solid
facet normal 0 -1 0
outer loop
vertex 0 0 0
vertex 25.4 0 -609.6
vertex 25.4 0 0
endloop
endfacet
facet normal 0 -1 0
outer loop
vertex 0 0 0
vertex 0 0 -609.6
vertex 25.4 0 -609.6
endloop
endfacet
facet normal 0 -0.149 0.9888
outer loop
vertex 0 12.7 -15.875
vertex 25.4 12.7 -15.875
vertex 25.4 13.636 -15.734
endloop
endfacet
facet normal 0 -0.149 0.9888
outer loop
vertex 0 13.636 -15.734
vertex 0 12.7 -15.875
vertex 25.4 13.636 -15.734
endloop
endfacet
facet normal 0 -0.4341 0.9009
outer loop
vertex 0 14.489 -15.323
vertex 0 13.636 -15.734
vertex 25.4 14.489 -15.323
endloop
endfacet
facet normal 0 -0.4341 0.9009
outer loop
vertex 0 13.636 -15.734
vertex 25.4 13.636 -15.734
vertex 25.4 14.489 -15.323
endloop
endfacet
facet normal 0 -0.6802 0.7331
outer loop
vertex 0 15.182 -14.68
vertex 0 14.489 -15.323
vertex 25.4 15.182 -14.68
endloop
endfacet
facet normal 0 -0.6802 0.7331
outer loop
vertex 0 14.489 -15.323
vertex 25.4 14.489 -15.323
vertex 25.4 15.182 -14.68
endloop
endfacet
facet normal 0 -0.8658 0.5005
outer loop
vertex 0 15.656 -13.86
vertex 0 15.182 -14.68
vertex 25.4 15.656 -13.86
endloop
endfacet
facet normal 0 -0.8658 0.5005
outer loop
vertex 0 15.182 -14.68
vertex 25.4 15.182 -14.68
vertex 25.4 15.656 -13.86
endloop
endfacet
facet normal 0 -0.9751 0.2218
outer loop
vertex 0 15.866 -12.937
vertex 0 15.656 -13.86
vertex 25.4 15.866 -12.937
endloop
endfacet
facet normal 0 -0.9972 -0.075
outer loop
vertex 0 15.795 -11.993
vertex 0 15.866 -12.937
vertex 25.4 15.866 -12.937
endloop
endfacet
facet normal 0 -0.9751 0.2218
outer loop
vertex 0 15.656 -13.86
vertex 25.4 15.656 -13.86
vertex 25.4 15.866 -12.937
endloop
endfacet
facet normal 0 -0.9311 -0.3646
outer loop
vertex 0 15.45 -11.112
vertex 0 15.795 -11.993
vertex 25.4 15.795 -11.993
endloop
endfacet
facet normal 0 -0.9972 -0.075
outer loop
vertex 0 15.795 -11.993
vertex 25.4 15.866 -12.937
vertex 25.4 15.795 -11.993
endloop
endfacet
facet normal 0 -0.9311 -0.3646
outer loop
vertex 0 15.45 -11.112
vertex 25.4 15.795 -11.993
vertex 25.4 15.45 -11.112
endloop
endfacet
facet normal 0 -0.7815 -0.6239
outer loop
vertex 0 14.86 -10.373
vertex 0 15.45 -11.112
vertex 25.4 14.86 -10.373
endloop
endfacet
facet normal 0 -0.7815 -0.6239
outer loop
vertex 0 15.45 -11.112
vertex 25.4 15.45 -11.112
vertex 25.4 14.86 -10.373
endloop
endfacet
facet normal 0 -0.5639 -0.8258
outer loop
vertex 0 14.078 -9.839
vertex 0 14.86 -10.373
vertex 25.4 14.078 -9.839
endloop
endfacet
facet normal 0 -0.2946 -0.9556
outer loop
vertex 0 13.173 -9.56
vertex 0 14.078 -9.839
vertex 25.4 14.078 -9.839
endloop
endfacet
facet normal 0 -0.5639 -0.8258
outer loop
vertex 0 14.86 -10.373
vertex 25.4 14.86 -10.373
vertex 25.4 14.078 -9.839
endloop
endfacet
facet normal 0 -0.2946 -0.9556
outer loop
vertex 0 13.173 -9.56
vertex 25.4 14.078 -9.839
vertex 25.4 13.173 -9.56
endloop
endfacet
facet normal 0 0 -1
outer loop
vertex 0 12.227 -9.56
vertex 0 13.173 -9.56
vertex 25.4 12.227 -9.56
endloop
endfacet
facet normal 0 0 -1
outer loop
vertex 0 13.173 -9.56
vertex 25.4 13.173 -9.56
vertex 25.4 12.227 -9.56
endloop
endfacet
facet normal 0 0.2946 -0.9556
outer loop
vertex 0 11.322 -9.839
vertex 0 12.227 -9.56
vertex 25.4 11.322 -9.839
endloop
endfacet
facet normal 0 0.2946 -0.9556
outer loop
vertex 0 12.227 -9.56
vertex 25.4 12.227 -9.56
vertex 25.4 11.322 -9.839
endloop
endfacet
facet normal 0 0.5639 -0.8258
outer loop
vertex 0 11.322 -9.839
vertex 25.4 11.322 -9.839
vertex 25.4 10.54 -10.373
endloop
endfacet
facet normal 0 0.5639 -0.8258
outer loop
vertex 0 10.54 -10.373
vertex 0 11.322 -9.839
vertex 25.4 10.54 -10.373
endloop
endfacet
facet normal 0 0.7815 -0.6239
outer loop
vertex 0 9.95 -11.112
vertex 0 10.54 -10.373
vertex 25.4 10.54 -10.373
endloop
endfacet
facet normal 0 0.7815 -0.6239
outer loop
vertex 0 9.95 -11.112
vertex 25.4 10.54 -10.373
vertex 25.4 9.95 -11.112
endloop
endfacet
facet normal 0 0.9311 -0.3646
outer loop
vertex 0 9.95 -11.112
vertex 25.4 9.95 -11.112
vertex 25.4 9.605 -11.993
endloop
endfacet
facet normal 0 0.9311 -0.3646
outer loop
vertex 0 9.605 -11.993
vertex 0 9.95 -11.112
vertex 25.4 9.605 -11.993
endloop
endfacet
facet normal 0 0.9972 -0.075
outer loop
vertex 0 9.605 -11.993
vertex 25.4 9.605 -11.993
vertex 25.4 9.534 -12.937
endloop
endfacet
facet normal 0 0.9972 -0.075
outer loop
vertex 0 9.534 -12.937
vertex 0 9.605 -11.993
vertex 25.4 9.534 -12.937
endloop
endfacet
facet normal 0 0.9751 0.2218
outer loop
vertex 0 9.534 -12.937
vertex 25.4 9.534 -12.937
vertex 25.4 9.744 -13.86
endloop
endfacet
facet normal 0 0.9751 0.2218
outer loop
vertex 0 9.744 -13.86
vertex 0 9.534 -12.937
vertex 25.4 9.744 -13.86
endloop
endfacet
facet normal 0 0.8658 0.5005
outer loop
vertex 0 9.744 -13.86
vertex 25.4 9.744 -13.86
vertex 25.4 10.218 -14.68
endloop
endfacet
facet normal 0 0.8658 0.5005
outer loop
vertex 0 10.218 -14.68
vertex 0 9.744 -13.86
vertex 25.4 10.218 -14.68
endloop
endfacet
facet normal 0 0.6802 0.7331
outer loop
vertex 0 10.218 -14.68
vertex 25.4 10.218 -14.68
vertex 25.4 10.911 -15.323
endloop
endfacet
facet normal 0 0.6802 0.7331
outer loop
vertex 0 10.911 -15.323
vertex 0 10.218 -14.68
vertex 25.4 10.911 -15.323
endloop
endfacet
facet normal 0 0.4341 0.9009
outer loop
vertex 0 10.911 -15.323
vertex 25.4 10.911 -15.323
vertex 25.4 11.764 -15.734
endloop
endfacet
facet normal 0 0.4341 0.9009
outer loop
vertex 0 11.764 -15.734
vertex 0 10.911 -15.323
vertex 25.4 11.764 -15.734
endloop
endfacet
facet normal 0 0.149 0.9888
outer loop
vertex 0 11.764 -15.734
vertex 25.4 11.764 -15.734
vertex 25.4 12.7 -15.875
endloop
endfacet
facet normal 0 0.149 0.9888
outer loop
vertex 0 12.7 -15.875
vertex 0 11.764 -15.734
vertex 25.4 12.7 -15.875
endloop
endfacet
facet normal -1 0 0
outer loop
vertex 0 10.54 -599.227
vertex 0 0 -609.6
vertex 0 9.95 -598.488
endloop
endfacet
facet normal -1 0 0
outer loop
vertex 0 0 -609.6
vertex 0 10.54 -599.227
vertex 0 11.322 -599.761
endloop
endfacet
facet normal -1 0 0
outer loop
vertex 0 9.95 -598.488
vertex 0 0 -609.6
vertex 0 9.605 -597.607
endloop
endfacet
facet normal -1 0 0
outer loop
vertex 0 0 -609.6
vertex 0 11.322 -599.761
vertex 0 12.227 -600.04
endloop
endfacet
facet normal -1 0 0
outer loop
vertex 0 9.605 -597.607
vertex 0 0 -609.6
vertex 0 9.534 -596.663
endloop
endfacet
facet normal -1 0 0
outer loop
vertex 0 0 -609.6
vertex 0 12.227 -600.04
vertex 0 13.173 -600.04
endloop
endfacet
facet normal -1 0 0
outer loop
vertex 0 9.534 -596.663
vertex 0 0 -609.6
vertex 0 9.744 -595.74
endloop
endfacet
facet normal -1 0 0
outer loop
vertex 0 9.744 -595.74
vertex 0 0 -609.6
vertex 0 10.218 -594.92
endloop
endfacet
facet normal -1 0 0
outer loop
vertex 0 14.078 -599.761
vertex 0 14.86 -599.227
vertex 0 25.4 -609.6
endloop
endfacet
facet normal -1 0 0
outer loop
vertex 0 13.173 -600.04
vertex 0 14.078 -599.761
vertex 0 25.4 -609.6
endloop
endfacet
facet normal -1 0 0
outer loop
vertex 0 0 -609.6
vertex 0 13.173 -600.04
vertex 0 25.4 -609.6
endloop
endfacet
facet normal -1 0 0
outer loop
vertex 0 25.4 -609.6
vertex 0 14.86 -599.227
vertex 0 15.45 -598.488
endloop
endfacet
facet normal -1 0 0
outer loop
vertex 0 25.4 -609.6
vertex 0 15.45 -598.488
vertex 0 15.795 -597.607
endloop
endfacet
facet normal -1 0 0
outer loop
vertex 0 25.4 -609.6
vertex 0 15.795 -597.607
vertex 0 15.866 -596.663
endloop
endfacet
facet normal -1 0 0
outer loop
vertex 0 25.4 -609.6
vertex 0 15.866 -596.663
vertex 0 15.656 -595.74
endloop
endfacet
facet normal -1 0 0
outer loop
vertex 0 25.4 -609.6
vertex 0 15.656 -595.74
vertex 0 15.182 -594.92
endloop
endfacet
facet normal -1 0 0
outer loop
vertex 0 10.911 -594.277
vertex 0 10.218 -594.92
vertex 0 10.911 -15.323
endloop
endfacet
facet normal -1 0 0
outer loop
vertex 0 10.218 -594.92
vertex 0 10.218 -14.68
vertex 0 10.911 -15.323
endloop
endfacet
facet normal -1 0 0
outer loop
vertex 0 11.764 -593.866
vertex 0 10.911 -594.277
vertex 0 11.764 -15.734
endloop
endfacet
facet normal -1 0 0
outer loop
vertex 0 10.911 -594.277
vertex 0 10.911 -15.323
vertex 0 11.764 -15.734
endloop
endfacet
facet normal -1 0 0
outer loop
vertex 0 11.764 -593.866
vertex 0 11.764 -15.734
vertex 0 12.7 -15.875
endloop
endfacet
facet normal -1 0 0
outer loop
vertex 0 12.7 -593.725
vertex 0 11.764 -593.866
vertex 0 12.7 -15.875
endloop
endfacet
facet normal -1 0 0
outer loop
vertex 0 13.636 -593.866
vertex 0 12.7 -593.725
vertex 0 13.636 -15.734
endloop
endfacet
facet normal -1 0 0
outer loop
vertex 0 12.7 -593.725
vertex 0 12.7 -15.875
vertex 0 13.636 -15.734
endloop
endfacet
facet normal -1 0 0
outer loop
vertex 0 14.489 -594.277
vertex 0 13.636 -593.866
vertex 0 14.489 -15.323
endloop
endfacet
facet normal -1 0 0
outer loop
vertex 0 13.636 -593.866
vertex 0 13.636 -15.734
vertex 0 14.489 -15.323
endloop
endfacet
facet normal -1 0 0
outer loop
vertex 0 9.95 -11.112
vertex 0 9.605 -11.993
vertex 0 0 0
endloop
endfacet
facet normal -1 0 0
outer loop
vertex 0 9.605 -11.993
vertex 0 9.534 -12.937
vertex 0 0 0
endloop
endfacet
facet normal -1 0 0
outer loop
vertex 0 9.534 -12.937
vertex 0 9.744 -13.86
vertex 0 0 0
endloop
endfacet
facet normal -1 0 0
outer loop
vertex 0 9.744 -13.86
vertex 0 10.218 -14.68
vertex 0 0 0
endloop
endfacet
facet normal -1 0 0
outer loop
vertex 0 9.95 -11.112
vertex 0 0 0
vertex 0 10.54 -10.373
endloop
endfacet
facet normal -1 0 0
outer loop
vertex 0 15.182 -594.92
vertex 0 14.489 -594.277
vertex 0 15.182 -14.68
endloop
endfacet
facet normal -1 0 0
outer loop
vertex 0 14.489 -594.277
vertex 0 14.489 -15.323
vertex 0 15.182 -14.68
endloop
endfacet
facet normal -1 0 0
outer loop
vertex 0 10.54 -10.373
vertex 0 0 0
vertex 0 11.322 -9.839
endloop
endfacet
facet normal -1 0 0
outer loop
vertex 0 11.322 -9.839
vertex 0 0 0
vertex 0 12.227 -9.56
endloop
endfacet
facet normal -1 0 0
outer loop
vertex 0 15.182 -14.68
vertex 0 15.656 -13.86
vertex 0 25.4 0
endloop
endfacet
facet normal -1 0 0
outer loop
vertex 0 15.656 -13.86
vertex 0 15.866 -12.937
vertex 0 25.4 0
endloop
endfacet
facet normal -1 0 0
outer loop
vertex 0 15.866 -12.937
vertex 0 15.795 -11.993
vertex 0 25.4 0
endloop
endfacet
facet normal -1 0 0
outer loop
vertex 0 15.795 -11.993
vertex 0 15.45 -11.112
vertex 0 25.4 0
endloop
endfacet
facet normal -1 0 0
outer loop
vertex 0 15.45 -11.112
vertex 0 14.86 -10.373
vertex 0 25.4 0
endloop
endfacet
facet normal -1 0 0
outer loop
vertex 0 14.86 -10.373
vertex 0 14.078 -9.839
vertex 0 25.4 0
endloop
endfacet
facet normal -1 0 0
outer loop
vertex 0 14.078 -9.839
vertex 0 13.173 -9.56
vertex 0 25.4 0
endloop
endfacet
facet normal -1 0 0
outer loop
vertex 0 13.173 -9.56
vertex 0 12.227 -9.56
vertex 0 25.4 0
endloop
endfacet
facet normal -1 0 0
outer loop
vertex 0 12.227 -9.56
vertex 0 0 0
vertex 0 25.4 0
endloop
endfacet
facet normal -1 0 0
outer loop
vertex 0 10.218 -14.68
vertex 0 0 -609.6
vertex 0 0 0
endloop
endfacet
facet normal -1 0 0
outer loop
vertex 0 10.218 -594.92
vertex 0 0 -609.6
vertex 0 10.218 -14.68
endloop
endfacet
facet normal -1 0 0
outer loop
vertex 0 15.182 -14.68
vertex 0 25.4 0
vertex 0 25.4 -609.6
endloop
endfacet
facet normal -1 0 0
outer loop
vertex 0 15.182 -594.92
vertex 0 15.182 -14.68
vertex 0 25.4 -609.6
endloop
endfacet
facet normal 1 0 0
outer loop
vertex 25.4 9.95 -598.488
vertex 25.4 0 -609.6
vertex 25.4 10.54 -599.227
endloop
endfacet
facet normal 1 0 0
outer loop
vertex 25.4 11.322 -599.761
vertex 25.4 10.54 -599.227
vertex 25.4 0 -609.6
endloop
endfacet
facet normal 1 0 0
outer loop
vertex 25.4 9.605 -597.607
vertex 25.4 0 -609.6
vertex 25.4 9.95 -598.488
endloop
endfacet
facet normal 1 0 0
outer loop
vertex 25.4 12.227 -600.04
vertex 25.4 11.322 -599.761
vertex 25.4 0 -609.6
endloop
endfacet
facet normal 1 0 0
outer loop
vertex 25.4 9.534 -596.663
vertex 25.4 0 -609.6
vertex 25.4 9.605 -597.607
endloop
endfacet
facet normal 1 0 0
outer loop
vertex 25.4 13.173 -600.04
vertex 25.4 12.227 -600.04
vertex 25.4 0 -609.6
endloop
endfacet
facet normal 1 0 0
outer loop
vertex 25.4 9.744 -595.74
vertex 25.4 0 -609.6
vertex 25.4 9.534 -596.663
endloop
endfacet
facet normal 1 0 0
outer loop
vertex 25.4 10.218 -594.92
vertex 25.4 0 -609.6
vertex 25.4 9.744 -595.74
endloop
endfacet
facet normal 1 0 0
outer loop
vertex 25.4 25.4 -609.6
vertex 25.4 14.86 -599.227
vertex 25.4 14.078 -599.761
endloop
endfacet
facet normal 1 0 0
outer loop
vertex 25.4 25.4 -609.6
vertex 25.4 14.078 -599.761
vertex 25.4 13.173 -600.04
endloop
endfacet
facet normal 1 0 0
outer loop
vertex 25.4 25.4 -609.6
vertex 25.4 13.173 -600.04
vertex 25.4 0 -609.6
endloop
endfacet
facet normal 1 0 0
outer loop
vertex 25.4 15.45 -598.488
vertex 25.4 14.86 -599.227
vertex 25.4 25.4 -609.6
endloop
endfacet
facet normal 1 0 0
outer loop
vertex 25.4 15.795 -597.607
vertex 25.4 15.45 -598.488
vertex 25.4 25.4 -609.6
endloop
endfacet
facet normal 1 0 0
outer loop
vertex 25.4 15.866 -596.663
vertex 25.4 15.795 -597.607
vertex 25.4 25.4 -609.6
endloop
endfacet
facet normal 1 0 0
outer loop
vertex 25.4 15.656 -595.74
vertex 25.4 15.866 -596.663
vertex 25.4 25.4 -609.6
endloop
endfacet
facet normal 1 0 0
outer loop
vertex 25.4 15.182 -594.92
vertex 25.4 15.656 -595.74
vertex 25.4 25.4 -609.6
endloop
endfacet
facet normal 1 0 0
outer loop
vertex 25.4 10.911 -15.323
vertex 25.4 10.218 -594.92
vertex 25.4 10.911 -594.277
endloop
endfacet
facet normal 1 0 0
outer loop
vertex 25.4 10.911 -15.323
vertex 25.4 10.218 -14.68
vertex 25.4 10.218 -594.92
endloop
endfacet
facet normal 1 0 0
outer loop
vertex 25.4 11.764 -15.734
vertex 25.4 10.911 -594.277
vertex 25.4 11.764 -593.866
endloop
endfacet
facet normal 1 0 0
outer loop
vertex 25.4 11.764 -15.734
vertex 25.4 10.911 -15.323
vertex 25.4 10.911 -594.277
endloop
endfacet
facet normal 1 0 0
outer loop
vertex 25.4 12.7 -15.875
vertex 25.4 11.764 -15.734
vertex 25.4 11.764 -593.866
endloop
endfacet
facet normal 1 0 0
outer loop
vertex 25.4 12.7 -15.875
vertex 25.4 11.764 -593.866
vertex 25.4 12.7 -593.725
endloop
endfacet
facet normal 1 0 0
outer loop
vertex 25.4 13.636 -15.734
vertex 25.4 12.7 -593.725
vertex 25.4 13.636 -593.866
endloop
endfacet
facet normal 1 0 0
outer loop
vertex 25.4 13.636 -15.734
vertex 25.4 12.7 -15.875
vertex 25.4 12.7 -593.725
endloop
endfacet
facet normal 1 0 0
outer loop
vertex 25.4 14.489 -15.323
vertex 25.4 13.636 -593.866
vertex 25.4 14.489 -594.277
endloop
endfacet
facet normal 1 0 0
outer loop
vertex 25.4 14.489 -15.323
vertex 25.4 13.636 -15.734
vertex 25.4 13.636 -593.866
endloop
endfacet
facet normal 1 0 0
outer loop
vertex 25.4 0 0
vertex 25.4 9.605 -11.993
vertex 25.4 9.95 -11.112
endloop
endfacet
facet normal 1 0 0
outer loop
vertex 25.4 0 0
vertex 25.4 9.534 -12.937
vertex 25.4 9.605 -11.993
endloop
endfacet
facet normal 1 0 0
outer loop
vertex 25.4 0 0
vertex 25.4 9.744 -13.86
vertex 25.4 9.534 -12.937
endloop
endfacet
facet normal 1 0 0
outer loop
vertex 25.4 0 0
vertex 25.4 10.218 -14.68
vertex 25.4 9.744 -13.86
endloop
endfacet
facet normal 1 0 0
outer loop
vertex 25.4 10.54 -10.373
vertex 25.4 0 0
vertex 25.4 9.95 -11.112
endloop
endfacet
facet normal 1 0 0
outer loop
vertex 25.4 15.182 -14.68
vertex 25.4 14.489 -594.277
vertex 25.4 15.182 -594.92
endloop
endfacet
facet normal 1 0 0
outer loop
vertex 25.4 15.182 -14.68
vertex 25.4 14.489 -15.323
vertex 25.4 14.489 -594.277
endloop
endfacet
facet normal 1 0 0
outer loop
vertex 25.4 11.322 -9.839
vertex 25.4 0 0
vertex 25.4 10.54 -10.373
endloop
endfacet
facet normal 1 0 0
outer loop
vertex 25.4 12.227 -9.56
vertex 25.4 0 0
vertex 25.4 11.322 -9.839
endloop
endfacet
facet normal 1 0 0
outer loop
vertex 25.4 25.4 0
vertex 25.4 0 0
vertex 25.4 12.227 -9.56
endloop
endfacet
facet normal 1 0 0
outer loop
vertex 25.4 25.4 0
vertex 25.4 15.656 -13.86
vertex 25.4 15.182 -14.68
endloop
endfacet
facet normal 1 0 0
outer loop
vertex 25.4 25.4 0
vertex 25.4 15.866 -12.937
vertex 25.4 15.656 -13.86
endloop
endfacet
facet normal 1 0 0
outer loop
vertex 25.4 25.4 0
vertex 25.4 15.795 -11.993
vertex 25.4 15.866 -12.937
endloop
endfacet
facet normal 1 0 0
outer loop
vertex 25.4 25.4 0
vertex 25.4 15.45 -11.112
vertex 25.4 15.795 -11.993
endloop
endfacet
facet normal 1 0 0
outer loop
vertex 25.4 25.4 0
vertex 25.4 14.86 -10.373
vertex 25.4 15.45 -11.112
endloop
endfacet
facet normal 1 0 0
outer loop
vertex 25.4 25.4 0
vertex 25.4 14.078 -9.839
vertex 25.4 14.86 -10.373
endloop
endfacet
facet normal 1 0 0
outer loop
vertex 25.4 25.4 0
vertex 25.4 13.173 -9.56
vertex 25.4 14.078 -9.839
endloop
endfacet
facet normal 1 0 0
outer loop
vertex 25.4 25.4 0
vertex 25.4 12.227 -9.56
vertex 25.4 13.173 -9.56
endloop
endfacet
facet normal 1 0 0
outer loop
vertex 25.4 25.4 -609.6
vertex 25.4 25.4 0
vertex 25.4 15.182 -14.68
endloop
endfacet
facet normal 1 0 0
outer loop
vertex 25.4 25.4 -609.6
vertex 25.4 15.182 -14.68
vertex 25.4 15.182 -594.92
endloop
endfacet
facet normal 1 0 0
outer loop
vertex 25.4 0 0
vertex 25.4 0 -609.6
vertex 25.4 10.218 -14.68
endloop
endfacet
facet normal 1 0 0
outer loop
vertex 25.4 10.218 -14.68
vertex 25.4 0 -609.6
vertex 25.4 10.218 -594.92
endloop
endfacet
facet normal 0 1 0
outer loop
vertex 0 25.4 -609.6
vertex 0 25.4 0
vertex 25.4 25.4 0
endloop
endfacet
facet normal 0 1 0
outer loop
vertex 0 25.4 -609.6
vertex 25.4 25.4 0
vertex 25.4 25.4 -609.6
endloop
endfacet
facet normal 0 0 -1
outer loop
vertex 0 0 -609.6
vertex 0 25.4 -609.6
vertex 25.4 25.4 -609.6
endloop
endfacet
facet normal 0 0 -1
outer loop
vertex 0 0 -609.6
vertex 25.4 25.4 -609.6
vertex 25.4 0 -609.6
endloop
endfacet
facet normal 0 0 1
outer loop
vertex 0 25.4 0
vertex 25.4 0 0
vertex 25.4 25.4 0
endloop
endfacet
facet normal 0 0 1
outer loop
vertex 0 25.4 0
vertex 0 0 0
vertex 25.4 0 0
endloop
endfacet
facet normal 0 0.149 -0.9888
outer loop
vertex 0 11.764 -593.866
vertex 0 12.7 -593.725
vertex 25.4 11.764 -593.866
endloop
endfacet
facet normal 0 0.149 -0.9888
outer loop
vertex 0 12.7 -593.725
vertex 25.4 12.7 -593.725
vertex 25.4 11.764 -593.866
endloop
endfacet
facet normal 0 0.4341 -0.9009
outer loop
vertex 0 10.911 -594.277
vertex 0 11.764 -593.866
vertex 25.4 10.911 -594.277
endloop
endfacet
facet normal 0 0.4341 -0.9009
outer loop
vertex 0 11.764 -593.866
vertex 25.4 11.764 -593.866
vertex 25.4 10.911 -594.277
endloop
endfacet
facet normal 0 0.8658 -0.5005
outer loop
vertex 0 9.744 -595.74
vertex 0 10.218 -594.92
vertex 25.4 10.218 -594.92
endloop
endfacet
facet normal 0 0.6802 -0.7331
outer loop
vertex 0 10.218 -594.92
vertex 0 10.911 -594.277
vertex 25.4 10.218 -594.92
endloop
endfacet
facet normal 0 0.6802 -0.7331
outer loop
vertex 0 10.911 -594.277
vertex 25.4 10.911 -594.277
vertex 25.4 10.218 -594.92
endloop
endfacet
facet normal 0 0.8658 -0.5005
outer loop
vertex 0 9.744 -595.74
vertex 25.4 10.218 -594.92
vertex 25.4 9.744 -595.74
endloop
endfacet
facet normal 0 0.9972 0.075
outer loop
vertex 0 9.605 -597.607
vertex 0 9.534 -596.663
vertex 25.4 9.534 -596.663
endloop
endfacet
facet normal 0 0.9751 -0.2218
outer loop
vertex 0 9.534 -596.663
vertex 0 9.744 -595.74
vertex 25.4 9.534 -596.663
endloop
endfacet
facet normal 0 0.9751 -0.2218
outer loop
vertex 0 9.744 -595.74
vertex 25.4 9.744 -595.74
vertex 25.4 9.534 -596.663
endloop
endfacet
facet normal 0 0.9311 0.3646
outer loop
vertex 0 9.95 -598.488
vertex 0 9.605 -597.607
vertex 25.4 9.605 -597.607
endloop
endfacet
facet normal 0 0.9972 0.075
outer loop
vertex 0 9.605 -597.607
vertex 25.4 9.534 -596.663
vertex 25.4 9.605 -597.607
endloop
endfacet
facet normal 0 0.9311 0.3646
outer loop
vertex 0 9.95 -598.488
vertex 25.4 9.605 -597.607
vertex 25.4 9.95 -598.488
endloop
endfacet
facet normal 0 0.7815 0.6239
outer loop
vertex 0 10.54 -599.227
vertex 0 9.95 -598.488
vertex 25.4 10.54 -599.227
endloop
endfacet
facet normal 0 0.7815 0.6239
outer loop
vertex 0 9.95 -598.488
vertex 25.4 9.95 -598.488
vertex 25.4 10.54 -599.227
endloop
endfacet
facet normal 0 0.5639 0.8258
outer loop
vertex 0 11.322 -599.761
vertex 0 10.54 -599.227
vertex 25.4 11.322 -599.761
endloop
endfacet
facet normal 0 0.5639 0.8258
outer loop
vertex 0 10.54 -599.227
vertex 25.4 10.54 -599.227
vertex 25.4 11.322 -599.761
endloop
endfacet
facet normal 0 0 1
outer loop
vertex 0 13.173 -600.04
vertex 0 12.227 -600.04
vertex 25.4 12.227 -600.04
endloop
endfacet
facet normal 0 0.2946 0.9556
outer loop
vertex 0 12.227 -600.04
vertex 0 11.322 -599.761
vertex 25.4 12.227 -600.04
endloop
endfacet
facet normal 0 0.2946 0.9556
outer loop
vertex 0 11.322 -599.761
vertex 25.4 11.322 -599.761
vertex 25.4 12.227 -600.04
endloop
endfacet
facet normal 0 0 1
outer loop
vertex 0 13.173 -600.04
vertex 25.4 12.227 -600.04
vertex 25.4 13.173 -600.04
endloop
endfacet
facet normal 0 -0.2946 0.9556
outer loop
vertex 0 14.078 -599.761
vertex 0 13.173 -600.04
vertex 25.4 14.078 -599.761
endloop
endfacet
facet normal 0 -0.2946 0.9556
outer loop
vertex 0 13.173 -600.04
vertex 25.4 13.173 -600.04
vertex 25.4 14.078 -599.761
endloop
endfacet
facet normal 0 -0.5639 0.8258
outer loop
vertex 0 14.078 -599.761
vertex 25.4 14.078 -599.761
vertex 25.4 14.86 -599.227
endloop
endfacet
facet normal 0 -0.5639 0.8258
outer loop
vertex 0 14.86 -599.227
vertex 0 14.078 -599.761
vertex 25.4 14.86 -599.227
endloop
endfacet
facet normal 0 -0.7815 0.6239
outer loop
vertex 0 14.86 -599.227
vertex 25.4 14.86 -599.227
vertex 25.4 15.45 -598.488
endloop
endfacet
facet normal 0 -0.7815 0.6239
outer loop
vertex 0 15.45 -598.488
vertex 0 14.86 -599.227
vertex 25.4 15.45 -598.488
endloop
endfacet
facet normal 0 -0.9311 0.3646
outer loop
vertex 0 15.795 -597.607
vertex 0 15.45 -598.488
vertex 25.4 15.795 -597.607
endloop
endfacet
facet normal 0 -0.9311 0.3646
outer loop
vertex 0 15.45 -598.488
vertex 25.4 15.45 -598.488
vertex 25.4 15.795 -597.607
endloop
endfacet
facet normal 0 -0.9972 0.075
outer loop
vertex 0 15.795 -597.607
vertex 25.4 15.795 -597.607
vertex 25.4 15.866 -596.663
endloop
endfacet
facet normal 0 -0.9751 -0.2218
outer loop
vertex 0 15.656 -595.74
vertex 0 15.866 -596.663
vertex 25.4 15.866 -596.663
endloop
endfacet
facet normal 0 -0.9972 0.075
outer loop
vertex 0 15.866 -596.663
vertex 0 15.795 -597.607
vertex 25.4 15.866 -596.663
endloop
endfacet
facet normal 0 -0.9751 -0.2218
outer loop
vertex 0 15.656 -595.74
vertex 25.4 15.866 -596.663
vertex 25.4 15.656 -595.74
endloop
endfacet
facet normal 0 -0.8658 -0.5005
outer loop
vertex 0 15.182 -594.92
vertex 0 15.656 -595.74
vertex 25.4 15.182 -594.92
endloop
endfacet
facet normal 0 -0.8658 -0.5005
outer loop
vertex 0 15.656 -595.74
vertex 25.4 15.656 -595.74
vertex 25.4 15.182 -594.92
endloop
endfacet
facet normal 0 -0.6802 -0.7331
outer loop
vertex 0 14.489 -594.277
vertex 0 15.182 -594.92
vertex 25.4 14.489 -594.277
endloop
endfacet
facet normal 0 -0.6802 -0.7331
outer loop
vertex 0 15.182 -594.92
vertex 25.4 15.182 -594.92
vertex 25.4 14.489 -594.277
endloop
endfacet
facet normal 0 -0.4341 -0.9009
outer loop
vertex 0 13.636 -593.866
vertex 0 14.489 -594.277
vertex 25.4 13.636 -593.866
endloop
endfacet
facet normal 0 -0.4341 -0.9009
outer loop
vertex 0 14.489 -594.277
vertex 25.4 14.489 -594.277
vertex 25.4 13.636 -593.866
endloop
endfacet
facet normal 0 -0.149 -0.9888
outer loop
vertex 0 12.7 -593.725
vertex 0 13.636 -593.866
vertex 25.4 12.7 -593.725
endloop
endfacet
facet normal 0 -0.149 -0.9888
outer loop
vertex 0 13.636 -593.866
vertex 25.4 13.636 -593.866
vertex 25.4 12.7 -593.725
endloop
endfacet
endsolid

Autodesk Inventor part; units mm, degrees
ref_plane "YZ Plane" through (0, 0, 0) normal (1, 0, 0) x (0, 1, 0)
ref_plane "XZ Plane" through (0, 0, 0) normal (0, 1, 0) x (-1, 0, 0)
sketch "Sketch1" plane through (0, 0, 0) normal (1, 0, 0) x (0, 1, 0)
  line L0 (0, 0) -> (25.4, 0)
  line L1 (25.4, 0) -> (25.4, -609.6)
  line L2 (25.4, -609.6) -> (0, -609.6)
  line L3 (0, -609.6) -> (0, 0)
  dimension "d0" = 25.4
  dimension "d1" = 609.6
extrude "Extrusion1" add sketch "Sketch1" along normal blind 25.4
sketch "Sketch3" plane through (25.4, 0, 0) normal (1, 0, 0) x (0, 0, -1)
  circle A0 centre (12.7, 12.7) radius 12.7
  line L0 (609.6, 25.4) -> (0, 25.4) projected
  line L1 (0, 25.4) -> (0, 0) projected
  circle A1 centre (12.7, 12.7) radius 3.175
  dimension "d12" = 25.4
  dimension "d13" = 6.35
extrude "Extrusion3" cut sketch "Sketch3" against normal blind 25.4 contours A1
ref_plane "Work Plane1" through (0, 0, -304.8) normal (0, 0, 1) x (1, 0, 0)
mirror "Mirror1" about plane through (0, 0, -304.8) normal (0, 0, 1) of "Extrusion3"
properties part number "bar"
